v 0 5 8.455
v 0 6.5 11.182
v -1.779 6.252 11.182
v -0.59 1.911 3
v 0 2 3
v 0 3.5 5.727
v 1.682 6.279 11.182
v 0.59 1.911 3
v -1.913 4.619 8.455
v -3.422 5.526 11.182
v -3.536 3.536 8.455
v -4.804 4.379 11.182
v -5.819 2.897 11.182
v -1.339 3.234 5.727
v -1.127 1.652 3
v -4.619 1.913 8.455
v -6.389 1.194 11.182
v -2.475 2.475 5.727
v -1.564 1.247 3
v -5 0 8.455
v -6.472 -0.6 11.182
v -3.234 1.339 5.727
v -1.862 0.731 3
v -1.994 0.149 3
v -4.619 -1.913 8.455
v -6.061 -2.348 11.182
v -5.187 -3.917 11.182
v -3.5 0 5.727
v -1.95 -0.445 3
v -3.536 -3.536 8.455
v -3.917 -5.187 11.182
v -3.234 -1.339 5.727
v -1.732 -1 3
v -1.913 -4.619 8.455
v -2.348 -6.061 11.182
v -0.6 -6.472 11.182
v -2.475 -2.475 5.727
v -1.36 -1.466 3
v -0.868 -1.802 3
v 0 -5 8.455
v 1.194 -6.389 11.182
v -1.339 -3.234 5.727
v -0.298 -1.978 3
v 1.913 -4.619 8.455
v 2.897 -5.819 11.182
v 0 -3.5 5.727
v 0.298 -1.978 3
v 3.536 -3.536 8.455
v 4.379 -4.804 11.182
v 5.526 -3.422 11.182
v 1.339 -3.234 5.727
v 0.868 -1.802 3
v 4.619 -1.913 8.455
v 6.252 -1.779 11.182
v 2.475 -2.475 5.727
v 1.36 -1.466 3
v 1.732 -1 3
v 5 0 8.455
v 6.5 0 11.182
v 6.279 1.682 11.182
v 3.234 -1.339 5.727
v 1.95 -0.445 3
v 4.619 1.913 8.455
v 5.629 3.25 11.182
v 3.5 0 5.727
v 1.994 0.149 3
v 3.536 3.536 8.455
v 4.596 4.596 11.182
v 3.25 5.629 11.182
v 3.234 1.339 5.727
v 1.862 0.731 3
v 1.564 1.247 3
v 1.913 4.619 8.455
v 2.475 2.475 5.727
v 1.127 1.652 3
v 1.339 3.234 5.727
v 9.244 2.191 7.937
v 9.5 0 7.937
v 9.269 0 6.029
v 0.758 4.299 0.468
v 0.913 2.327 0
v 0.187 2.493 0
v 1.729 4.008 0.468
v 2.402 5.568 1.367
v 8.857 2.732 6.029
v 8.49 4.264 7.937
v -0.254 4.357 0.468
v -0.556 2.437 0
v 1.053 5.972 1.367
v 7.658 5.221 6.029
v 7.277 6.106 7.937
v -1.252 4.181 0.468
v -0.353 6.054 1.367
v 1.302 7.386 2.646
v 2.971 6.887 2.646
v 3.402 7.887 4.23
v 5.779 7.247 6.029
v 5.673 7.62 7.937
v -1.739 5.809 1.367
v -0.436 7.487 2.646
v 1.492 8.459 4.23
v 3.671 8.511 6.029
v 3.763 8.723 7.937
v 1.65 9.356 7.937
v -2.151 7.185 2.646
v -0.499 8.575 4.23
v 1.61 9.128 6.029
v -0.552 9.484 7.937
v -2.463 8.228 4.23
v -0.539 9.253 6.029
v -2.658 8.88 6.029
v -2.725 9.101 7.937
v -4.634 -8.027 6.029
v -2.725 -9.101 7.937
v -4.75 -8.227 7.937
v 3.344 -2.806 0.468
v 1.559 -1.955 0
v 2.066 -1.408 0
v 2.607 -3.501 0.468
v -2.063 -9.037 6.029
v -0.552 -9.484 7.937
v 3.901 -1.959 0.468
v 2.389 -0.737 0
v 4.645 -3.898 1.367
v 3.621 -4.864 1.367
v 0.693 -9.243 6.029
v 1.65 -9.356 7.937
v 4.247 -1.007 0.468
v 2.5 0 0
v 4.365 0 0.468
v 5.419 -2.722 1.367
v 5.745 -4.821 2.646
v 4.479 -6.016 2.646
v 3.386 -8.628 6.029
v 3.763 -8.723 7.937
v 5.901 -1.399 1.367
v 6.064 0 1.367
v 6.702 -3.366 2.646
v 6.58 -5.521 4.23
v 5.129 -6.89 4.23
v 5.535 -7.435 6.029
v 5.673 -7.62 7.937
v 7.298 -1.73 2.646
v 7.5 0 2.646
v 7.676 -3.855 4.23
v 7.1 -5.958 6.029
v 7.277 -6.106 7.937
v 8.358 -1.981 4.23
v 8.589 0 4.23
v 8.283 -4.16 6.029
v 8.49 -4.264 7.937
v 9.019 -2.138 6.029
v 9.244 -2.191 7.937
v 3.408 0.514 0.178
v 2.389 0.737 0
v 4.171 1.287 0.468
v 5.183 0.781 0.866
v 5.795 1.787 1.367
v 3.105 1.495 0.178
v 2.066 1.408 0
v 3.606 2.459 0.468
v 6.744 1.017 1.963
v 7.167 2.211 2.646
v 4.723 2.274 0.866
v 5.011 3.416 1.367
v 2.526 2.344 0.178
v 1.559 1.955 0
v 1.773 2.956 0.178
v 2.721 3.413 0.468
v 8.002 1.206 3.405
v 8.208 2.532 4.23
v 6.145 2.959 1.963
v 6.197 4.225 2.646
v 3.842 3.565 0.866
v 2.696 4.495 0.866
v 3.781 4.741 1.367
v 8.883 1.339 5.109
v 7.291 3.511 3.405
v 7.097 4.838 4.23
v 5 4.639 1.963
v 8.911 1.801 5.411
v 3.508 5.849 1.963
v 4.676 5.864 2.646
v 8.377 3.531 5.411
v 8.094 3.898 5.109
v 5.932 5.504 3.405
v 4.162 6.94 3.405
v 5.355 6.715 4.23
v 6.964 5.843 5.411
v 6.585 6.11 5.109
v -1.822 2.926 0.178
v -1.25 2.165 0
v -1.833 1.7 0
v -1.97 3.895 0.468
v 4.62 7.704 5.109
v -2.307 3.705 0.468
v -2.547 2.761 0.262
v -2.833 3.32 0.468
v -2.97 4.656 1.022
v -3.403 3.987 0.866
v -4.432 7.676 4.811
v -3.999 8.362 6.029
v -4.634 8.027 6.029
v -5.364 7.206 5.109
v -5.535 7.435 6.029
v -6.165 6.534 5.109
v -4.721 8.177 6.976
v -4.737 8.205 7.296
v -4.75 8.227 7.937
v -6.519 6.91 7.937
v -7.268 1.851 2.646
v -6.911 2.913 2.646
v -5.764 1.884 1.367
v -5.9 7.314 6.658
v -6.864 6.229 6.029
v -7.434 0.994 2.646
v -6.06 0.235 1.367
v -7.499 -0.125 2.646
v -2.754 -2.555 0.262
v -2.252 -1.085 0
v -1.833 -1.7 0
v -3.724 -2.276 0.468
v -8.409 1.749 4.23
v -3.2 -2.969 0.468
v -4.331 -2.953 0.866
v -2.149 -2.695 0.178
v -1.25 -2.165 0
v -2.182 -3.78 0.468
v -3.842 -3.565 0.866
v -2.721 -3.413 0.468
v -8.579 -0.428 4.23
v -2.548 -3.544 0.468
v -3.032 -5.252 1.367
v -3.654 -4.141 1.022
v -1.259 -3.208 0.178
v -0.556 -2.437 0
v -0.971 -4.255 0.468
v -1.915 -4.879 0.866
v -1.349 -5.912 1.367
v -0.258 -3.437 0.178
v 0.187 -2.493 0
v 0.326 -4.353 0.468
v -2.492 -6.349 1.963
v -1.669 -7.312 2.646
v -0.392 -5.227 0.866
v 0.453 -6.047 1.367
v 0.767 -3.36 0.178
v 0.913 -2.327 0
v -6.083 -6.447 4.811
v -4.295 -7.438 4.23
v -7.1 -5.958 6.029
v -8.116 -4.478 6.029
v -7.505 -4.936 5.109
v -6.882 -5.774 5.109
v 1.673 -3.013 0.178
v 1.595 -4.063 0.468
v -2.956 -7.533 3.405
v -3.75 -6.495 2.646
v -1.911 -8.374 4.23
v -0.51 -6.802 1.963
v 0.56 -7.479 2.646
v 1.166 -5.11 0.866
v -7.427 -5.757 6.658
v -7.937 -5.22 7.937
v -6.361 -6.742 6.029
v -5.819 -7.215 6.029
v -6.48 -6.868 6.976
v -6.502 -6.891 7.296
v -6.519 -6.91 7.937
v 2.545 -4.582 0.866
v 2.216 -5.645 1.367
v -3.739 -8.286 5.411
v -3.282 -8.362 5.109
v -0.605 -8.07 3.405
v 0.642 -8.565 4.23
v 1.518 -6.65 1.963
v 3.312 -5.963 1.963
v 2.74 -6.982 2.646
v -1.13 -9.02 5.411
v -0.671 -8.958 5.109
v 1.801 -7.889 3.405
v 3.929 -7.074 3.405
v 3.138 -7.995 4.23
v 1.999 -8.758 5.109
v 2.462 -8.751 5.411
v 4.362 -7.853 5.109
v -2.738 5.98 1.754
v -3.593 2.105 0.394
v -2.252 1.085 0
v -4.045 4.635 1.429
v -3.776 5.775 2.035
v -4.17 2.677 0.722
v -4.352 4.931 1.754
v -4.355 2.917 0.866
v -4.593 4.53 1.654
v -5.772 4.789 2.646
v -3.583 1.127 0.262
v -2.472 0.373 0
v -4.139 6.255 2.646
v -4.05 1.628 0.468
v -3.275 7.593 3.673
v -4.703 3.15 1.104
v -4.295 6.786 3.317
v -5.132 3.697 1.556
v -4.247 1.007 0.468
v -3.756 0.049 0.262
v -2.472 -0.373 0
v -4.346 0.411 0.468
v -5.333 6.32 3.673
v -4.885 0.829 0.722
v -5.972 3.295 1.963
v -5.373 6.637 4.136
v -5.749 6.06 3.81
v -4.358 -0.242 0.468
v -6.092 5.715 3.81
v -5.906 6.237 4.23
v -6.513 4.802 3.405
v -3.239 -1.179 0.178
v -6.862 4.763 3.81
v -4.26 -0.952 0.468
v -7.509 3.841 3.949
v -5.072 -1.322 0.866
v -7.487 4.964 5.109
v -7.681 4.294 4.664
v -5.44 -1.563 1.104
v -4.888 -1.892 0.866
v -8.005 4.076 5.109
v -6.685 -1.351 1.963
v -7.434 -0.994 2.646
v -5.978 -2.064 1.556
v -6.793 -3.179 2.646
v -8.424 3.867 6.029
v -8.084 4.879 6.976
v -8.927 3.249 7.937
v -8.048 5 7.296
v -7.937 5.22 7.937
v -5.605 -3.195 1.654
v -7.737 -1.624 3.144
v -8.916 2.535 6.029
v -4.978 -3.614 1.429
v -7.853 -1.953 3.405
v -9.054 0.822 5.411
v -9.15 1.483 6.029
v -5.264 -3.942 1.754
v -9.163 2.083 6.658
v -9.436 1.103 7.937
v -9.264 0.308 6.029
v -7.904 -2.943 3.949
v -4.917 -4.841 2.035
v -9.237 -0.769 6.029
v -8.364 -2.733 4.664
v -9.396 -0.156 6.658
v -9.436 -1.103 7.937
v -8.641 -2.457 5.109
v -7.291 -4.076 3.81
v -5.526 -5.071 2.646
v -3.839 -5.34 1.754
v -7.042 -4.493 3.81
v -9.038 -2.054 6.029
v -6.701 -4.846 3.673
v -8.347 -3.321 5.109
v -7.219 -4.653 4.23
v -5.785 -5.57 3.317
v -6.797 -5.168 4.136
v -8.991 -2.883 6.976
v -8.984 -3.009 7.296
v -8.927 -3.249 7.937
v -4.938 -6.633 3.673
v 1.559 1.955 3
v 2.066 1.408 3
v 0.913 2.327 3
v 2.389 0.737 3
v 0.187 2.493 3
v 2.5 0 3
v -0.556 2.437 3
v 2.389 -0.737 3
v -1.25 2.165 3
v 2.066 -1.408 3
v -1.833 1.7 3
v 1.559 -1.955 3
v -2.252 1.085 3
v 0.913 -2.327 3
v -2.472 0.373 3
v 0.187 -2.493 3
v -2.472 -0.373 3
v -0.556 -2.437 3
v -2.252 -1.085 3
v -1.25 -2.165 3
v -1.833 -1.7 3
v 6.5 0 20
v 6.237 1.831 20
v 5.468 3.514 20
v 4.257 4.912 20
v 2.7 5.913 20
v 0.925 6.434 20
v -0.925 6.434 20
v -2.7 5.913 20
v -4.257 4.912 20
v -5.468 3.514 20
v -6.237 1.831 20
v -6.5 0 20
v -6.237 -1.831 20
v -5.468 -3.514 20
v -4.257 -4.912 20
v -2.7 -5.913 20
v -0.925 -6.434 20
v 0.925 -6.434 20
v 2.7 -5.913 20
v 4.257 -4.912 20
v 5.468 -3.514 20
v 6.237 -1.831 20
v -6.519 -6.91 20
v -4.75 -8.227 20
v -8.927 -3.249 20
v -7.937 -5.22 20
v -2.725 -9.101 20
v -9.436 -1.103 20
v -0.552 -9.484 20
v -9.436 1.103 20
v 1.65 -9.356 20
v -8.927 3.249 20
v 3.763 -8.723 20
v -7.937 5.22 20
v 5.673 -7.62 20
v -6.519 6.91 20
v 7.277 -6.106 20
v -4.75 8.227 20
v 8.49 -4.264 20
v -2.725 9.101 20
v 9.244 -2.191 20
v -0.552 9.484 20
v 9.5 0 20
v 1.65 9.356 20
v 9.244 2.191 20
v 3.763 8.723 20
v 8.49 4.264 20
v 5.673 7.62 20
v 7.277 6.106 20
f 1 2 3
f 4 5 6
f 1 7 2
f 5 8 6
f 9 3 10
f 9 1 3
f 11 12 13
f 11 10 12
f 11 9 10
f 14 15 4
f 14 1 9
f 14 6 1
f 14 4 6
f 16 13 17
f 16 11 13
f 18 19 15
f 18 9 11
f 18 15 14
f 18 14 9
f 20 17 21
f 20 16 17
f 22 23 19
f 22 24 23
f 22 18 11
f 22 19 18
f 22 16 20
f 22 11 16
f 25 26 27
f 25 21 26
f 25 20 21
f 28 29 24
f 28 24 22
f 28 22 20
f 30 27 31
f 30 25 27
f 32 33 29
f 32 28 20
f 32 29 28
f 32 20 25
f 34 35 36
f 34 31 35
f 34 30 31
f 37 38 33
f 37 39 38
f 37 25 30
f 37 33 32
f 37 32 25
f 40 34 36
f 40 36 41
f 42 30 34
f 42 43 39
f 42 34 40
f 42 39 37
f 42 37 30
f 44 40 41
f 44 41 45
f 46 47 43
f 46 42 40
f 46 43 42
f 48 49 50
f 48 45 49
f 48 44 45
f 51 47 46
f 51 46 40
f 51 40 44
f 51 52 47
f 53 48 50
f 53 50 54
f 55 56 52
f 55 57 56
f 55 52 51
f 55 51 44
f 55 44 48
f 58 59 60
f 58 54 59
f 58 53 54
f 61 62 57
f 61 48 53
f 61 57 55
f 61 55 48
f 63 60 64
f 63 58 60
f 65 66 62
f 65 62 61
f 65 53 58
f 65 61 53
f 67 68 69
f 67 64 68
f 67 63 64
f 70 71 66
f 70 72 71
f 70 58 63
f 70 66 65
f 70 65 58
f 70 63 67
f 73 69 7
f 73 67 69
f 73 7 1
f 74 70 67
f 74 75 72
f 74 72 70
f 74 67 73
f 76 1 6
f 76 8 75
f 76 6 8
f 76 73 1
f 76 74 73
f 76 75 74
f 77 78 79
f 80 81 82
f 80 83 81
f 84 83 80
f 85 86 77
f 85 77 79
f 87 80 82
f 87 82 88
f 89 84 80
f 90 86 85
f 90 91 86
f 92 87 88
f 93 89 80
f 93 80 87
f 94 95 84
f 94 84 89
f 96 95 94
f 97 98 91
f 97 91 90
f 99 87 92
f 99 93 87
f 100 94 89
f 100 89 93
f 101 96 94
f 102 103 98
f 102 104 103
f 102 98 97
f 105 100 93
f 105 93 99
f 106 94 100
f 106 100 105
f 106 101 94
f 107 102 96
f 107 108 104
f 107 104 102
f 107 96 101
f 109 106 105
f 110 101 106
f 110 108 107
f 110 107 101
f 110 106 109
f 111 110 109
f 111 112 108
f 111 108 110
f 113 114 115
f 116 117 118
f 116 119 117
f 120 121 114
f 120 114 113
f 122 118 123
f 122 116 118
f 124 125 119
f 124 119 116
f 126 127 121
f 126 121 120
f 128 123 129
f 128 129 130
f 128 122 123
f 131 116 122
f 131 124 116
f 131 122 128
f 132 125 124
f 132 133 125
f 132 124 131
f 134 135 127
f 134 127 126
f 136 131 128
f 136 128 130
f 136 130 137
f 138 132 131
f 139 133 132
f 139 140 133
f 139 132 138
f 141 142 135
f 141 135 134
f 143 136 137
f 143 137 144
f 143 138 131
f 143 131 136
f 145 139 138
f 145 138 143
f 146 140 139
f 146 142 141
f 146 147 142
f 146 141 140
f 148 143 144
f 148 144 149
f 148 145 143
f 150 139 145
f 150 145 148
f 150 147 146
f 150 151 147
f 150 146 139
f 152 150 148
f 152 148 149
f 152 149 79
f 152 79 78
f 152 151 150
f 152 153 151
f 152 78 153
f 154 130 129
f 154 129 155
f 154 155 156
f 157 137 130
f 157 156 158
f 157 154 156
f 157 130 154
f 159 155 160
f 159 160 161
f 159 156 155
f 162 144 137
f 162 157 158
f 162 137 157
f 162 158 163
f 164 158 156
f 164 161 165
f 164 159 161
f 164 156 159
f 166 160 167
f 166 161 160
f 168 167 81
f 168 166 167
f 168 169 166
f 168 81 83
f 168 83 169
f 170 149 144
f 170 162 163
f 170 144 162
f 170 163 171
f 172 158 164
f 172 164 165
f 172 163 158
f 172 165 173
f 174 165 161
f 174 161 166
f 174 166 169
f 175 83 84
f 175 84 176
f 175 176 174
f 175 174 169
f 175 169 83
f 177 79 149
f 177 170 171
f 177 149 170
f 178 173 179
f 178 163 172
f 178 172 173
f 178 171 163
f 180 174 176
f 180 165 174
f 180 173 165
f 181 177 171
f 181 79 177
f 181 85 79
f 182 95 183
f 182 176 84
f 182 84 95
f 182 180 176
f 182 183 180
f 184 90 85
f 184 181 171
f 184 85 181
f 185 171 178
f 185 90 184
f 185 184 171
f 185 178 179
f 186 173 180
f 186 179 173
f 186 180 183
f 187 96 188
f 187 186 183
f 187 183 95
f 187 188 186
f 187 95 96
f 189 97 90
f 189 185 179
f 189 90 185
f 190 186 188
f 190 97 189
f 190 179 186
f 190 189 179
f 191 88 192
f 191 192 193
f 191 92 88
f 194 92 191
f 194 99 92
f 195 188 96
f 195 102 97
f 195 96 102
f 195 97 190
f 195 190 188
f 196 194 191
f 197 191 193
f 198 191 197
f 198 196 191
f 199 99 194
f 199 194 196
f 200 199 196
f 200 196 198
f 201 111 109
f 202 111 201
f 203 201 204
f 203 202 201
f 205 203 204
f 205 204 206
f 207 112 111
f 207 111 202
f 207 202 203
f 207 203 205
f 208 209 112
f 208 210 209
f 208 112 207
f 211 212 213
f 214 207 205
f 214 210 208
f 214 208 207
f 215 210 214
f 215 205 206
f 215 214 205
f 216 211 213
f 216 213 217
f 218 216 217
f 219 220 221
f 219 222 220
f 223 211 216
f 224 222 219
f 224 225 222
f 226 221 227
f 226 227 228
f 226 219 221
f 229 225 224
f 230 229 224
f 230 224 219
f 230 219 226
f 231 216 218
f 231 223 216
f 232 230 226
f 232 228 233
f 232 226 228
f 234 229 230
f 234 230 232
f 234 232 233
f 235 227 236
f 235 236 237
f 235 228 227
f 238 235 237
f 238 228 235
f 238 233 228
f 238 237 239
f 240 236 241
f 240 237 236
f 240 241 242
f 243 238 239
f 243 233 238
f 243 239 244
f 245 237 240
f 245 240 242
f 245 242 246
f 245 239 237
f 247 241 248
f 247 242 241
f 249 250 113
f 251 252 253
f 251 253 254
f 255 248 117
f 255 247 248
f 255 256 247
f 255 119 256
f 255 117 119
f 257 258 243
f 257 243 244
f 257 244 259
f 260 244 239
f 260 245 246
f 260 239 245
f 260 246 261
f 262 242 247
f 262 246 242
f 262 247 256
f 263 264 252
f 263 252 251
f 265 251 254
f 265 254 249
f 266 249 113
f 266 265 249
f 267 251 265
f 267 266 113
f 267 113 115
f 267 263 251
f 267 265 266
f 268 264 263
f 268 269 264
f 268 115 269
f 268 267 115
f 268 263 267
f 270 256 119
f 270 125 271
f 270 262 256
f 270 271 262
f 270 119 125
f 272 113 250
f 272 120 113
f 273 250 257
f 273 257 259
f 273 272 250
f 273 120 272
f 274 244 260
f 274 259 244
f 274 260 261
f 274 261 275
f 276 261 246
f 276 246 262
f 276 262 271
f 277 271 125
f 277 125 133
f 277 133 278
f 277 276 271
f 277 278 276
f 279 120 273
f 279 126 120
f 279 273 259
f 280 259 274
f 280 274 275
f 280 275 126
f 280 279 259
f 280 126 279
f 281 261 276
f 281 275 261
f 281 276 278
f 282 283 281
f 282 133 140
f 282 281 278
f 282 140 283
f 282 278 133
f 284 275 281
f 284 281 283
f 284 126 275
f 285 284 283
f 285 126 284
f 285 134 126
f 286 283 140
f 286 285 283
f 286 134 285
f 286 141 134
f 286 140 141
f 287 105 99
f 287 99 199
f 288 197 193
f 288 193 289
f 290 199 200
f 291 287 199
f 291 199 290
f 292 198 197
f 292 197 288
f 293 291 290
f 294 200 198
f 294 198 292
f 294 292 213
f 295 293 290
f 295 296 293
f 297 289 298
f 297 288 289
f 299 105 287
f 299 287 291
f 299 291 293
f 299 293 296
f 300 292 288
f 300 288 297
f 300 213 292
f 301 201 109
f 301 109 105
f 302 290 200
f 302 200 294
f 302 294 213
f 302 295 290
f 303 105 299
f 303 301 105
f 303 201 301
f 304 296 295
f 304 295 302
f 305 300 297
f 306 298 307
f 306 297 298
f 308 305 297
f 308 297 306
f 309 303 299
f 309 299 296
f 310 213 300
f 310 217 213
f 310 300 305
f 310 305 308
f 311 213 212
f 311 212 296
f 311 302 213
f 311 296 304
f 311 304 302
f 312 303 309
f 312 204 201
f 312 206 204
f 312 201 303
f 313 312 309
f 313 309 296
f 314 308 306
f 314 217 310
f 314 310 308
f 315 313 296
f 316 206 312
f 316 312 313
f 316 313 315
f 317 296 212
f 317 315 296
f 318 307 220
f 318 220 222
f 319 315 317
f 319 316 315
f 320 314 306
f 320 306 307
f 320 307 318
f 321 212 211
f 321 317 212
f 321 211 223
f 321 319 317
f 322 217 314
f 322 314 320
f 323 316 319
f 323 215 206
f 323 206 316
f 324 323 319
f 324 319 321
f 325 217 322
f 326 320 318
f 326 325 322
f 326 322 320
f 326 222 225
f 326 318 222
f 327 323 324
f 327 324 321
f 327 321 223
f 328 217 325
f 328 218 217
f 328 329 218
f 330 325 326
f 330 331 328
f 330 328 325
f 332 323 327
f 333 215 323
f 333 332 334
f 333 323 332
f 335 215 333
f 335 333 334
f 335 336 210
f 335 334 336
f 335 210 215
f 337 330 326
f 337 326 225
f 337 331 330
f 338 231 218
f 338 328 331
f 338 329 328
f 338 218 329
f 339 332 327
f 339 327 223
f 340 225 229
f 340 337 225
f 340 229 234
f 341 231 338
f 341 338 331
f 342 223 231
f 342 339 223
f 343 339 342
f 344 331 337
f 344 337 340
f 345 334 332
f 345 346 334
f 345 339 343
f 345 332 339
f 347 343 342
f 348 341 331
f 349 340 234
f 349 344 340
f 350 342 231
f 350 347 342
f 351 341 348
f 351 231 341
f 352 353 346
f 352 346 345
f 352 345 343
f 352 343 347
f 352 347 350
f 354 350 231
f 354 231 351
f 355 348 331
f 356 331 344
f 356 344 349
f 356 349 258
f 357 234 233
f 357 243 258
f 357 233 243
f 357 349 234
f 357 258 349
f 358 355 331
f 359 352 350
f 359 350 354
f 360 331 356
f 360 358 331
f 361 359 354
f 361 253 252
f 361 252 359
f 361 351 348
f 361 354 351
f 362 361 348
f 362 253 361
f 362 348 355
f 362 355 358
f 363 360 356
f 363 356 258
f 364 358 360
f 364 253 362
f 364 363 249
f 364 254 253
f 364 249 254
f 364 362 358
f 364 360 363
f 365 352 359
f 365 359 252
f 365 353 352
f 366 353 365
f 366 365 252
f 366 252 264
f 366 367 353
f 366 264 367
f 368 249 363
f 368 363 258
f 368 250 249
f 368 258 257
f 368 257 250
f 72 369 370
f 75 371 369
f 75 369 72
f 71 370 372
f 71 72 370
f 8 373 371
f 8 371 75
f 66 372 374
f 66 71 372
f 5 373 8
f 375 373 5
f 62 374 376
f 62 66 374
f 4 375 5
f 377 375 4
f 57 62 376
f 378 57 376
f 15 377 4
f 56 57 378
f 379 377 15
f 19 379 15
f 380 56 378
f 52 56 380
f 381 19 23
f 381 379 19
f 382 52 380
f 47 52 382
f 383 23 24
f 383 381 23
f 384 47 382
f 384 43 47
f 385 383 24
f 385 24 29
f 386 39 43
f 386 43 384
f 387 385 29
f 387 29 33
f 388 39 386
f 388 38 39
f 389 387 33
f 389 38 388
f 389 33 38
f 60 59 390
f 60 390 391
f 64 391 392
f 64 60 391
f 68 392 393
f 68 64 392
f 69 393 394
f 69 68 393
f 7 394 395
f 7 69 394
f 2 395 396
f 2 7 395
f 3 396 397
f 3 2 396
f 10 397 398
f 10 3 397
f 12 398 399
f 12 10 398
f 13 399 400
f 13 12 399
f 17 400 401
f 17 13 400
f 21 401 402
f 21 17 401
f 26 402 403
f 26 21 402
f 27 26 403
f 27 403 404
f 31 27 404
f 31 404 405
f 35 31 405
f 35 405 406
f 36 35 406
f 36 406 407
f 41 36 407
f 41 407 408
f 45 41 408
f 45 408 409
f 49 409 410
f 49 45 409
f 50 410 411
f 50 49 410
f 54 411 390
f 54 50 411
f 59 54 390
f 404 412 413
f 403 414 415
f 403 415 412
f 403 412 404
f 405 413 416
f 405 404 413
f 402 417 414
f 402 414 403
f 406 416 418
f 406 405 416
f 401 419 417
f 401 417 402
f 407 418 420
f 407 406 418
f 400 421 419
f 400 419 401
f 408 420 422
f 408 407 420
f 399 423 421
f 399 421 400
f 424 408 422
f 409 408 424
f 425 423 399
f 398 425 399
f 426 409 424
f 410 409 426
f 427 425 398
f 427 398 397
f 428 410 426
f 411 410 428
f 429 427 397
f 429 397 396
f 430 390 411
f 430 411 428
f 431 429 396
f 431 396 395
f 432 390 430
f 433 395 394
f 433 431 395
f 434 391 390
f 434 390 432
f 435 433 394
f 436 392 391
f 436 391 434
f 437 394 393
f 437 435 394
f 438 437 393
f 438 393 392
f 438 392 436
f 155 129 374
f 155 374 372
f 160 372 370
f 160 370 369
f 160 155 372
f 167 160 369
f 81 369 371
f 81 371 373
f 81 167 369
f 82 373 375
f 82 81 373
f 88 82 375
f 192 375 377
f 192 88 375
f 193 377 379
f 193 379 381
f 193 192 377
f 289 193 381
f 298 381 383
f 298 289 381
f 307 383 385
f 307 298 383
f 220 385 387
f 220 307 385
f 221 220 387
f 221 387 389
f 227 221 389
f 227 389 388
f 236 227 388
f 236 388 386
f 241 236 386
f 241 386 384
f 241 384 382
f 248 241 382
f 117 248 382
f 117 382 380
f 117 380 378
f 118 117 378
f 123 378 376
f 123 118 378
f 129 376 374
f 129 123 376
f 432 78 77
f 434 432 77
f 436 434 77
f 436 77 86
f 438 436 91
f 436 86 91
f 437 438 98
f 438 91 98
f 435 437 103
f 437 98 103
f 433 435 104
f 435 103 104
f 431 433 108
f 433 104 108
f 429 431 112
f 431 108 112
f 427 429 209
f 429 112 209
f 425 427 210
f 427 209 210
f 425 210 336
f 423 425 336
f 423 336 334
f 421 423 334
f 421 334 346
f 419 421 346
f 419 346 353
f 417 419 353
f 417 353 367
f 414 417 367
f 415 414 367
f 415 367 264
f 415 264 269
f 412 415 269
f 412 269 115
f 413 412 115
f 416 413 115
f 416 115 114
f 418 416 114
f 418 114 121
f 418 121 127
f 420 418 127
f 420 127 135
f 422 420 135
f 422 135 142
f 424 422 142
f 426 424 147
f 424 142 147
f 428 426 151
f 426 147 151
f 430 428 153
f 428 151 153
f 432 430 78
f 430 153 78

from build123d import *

# Parameters (mm, degrees)
F0_R     = 6.5
F0_R_2   = 2.5
F1_DEPTH = 3
F0_R_3   = 9.5
F2_DEPTH = 20


# Not quite as in the source:
# - a fillet or chamfer that OpenCascade refuses, or shapes differently, is made with other operations: its cross-section is extruded or revolved along the edge and cut away or added


with BuildPart() as f1:
    # F0 (on Top) → F1 (new body)
    with BuildSketch(Plane.XY):
        Circle(F0_R)
        Circle(F0_R_2, mode=Mode.SUBTRACT)
    extrude(amount=F1_DEPTH)

    # F0 (on Top) → F2 (join)
    with BuildSketch(Plane.XY):
        Circle(F0_R_3)
        Circle(F0_R, mode=Mode.SUBTRACT)
    extrude(amount=F2_DEPTH)

    # F3: fillet of radius 8 on 1 edges, made by hand

    # F3_s1 → F3_t2 (revolve, cut)
    with BuildSketch(Plane.XZ):
        with BuildLine():
            ThreePointArc((2.5, 0), (7.5, 2.6457513111), (9.5, 7.9372539332))
            Line((9.5, 7.9372539332), (9.5, 0))
            Line((9.5, 0), (2.5, 0))
        make_face()
    revolve(axis=Axis((0, 0, 0), (0, 0, 1)), mode=Mode.SUBTRACT)

    # F4 (on Right) → F5 (revolve)
    with BuildSketch(Plane.YZ):
        Polygon((7.5, 13), (2, 3), (7.5, 3), align=None)
    revolve(axis=Axis((0, 0, 1.5), (0, 0, 1)))


solid = f1.part
